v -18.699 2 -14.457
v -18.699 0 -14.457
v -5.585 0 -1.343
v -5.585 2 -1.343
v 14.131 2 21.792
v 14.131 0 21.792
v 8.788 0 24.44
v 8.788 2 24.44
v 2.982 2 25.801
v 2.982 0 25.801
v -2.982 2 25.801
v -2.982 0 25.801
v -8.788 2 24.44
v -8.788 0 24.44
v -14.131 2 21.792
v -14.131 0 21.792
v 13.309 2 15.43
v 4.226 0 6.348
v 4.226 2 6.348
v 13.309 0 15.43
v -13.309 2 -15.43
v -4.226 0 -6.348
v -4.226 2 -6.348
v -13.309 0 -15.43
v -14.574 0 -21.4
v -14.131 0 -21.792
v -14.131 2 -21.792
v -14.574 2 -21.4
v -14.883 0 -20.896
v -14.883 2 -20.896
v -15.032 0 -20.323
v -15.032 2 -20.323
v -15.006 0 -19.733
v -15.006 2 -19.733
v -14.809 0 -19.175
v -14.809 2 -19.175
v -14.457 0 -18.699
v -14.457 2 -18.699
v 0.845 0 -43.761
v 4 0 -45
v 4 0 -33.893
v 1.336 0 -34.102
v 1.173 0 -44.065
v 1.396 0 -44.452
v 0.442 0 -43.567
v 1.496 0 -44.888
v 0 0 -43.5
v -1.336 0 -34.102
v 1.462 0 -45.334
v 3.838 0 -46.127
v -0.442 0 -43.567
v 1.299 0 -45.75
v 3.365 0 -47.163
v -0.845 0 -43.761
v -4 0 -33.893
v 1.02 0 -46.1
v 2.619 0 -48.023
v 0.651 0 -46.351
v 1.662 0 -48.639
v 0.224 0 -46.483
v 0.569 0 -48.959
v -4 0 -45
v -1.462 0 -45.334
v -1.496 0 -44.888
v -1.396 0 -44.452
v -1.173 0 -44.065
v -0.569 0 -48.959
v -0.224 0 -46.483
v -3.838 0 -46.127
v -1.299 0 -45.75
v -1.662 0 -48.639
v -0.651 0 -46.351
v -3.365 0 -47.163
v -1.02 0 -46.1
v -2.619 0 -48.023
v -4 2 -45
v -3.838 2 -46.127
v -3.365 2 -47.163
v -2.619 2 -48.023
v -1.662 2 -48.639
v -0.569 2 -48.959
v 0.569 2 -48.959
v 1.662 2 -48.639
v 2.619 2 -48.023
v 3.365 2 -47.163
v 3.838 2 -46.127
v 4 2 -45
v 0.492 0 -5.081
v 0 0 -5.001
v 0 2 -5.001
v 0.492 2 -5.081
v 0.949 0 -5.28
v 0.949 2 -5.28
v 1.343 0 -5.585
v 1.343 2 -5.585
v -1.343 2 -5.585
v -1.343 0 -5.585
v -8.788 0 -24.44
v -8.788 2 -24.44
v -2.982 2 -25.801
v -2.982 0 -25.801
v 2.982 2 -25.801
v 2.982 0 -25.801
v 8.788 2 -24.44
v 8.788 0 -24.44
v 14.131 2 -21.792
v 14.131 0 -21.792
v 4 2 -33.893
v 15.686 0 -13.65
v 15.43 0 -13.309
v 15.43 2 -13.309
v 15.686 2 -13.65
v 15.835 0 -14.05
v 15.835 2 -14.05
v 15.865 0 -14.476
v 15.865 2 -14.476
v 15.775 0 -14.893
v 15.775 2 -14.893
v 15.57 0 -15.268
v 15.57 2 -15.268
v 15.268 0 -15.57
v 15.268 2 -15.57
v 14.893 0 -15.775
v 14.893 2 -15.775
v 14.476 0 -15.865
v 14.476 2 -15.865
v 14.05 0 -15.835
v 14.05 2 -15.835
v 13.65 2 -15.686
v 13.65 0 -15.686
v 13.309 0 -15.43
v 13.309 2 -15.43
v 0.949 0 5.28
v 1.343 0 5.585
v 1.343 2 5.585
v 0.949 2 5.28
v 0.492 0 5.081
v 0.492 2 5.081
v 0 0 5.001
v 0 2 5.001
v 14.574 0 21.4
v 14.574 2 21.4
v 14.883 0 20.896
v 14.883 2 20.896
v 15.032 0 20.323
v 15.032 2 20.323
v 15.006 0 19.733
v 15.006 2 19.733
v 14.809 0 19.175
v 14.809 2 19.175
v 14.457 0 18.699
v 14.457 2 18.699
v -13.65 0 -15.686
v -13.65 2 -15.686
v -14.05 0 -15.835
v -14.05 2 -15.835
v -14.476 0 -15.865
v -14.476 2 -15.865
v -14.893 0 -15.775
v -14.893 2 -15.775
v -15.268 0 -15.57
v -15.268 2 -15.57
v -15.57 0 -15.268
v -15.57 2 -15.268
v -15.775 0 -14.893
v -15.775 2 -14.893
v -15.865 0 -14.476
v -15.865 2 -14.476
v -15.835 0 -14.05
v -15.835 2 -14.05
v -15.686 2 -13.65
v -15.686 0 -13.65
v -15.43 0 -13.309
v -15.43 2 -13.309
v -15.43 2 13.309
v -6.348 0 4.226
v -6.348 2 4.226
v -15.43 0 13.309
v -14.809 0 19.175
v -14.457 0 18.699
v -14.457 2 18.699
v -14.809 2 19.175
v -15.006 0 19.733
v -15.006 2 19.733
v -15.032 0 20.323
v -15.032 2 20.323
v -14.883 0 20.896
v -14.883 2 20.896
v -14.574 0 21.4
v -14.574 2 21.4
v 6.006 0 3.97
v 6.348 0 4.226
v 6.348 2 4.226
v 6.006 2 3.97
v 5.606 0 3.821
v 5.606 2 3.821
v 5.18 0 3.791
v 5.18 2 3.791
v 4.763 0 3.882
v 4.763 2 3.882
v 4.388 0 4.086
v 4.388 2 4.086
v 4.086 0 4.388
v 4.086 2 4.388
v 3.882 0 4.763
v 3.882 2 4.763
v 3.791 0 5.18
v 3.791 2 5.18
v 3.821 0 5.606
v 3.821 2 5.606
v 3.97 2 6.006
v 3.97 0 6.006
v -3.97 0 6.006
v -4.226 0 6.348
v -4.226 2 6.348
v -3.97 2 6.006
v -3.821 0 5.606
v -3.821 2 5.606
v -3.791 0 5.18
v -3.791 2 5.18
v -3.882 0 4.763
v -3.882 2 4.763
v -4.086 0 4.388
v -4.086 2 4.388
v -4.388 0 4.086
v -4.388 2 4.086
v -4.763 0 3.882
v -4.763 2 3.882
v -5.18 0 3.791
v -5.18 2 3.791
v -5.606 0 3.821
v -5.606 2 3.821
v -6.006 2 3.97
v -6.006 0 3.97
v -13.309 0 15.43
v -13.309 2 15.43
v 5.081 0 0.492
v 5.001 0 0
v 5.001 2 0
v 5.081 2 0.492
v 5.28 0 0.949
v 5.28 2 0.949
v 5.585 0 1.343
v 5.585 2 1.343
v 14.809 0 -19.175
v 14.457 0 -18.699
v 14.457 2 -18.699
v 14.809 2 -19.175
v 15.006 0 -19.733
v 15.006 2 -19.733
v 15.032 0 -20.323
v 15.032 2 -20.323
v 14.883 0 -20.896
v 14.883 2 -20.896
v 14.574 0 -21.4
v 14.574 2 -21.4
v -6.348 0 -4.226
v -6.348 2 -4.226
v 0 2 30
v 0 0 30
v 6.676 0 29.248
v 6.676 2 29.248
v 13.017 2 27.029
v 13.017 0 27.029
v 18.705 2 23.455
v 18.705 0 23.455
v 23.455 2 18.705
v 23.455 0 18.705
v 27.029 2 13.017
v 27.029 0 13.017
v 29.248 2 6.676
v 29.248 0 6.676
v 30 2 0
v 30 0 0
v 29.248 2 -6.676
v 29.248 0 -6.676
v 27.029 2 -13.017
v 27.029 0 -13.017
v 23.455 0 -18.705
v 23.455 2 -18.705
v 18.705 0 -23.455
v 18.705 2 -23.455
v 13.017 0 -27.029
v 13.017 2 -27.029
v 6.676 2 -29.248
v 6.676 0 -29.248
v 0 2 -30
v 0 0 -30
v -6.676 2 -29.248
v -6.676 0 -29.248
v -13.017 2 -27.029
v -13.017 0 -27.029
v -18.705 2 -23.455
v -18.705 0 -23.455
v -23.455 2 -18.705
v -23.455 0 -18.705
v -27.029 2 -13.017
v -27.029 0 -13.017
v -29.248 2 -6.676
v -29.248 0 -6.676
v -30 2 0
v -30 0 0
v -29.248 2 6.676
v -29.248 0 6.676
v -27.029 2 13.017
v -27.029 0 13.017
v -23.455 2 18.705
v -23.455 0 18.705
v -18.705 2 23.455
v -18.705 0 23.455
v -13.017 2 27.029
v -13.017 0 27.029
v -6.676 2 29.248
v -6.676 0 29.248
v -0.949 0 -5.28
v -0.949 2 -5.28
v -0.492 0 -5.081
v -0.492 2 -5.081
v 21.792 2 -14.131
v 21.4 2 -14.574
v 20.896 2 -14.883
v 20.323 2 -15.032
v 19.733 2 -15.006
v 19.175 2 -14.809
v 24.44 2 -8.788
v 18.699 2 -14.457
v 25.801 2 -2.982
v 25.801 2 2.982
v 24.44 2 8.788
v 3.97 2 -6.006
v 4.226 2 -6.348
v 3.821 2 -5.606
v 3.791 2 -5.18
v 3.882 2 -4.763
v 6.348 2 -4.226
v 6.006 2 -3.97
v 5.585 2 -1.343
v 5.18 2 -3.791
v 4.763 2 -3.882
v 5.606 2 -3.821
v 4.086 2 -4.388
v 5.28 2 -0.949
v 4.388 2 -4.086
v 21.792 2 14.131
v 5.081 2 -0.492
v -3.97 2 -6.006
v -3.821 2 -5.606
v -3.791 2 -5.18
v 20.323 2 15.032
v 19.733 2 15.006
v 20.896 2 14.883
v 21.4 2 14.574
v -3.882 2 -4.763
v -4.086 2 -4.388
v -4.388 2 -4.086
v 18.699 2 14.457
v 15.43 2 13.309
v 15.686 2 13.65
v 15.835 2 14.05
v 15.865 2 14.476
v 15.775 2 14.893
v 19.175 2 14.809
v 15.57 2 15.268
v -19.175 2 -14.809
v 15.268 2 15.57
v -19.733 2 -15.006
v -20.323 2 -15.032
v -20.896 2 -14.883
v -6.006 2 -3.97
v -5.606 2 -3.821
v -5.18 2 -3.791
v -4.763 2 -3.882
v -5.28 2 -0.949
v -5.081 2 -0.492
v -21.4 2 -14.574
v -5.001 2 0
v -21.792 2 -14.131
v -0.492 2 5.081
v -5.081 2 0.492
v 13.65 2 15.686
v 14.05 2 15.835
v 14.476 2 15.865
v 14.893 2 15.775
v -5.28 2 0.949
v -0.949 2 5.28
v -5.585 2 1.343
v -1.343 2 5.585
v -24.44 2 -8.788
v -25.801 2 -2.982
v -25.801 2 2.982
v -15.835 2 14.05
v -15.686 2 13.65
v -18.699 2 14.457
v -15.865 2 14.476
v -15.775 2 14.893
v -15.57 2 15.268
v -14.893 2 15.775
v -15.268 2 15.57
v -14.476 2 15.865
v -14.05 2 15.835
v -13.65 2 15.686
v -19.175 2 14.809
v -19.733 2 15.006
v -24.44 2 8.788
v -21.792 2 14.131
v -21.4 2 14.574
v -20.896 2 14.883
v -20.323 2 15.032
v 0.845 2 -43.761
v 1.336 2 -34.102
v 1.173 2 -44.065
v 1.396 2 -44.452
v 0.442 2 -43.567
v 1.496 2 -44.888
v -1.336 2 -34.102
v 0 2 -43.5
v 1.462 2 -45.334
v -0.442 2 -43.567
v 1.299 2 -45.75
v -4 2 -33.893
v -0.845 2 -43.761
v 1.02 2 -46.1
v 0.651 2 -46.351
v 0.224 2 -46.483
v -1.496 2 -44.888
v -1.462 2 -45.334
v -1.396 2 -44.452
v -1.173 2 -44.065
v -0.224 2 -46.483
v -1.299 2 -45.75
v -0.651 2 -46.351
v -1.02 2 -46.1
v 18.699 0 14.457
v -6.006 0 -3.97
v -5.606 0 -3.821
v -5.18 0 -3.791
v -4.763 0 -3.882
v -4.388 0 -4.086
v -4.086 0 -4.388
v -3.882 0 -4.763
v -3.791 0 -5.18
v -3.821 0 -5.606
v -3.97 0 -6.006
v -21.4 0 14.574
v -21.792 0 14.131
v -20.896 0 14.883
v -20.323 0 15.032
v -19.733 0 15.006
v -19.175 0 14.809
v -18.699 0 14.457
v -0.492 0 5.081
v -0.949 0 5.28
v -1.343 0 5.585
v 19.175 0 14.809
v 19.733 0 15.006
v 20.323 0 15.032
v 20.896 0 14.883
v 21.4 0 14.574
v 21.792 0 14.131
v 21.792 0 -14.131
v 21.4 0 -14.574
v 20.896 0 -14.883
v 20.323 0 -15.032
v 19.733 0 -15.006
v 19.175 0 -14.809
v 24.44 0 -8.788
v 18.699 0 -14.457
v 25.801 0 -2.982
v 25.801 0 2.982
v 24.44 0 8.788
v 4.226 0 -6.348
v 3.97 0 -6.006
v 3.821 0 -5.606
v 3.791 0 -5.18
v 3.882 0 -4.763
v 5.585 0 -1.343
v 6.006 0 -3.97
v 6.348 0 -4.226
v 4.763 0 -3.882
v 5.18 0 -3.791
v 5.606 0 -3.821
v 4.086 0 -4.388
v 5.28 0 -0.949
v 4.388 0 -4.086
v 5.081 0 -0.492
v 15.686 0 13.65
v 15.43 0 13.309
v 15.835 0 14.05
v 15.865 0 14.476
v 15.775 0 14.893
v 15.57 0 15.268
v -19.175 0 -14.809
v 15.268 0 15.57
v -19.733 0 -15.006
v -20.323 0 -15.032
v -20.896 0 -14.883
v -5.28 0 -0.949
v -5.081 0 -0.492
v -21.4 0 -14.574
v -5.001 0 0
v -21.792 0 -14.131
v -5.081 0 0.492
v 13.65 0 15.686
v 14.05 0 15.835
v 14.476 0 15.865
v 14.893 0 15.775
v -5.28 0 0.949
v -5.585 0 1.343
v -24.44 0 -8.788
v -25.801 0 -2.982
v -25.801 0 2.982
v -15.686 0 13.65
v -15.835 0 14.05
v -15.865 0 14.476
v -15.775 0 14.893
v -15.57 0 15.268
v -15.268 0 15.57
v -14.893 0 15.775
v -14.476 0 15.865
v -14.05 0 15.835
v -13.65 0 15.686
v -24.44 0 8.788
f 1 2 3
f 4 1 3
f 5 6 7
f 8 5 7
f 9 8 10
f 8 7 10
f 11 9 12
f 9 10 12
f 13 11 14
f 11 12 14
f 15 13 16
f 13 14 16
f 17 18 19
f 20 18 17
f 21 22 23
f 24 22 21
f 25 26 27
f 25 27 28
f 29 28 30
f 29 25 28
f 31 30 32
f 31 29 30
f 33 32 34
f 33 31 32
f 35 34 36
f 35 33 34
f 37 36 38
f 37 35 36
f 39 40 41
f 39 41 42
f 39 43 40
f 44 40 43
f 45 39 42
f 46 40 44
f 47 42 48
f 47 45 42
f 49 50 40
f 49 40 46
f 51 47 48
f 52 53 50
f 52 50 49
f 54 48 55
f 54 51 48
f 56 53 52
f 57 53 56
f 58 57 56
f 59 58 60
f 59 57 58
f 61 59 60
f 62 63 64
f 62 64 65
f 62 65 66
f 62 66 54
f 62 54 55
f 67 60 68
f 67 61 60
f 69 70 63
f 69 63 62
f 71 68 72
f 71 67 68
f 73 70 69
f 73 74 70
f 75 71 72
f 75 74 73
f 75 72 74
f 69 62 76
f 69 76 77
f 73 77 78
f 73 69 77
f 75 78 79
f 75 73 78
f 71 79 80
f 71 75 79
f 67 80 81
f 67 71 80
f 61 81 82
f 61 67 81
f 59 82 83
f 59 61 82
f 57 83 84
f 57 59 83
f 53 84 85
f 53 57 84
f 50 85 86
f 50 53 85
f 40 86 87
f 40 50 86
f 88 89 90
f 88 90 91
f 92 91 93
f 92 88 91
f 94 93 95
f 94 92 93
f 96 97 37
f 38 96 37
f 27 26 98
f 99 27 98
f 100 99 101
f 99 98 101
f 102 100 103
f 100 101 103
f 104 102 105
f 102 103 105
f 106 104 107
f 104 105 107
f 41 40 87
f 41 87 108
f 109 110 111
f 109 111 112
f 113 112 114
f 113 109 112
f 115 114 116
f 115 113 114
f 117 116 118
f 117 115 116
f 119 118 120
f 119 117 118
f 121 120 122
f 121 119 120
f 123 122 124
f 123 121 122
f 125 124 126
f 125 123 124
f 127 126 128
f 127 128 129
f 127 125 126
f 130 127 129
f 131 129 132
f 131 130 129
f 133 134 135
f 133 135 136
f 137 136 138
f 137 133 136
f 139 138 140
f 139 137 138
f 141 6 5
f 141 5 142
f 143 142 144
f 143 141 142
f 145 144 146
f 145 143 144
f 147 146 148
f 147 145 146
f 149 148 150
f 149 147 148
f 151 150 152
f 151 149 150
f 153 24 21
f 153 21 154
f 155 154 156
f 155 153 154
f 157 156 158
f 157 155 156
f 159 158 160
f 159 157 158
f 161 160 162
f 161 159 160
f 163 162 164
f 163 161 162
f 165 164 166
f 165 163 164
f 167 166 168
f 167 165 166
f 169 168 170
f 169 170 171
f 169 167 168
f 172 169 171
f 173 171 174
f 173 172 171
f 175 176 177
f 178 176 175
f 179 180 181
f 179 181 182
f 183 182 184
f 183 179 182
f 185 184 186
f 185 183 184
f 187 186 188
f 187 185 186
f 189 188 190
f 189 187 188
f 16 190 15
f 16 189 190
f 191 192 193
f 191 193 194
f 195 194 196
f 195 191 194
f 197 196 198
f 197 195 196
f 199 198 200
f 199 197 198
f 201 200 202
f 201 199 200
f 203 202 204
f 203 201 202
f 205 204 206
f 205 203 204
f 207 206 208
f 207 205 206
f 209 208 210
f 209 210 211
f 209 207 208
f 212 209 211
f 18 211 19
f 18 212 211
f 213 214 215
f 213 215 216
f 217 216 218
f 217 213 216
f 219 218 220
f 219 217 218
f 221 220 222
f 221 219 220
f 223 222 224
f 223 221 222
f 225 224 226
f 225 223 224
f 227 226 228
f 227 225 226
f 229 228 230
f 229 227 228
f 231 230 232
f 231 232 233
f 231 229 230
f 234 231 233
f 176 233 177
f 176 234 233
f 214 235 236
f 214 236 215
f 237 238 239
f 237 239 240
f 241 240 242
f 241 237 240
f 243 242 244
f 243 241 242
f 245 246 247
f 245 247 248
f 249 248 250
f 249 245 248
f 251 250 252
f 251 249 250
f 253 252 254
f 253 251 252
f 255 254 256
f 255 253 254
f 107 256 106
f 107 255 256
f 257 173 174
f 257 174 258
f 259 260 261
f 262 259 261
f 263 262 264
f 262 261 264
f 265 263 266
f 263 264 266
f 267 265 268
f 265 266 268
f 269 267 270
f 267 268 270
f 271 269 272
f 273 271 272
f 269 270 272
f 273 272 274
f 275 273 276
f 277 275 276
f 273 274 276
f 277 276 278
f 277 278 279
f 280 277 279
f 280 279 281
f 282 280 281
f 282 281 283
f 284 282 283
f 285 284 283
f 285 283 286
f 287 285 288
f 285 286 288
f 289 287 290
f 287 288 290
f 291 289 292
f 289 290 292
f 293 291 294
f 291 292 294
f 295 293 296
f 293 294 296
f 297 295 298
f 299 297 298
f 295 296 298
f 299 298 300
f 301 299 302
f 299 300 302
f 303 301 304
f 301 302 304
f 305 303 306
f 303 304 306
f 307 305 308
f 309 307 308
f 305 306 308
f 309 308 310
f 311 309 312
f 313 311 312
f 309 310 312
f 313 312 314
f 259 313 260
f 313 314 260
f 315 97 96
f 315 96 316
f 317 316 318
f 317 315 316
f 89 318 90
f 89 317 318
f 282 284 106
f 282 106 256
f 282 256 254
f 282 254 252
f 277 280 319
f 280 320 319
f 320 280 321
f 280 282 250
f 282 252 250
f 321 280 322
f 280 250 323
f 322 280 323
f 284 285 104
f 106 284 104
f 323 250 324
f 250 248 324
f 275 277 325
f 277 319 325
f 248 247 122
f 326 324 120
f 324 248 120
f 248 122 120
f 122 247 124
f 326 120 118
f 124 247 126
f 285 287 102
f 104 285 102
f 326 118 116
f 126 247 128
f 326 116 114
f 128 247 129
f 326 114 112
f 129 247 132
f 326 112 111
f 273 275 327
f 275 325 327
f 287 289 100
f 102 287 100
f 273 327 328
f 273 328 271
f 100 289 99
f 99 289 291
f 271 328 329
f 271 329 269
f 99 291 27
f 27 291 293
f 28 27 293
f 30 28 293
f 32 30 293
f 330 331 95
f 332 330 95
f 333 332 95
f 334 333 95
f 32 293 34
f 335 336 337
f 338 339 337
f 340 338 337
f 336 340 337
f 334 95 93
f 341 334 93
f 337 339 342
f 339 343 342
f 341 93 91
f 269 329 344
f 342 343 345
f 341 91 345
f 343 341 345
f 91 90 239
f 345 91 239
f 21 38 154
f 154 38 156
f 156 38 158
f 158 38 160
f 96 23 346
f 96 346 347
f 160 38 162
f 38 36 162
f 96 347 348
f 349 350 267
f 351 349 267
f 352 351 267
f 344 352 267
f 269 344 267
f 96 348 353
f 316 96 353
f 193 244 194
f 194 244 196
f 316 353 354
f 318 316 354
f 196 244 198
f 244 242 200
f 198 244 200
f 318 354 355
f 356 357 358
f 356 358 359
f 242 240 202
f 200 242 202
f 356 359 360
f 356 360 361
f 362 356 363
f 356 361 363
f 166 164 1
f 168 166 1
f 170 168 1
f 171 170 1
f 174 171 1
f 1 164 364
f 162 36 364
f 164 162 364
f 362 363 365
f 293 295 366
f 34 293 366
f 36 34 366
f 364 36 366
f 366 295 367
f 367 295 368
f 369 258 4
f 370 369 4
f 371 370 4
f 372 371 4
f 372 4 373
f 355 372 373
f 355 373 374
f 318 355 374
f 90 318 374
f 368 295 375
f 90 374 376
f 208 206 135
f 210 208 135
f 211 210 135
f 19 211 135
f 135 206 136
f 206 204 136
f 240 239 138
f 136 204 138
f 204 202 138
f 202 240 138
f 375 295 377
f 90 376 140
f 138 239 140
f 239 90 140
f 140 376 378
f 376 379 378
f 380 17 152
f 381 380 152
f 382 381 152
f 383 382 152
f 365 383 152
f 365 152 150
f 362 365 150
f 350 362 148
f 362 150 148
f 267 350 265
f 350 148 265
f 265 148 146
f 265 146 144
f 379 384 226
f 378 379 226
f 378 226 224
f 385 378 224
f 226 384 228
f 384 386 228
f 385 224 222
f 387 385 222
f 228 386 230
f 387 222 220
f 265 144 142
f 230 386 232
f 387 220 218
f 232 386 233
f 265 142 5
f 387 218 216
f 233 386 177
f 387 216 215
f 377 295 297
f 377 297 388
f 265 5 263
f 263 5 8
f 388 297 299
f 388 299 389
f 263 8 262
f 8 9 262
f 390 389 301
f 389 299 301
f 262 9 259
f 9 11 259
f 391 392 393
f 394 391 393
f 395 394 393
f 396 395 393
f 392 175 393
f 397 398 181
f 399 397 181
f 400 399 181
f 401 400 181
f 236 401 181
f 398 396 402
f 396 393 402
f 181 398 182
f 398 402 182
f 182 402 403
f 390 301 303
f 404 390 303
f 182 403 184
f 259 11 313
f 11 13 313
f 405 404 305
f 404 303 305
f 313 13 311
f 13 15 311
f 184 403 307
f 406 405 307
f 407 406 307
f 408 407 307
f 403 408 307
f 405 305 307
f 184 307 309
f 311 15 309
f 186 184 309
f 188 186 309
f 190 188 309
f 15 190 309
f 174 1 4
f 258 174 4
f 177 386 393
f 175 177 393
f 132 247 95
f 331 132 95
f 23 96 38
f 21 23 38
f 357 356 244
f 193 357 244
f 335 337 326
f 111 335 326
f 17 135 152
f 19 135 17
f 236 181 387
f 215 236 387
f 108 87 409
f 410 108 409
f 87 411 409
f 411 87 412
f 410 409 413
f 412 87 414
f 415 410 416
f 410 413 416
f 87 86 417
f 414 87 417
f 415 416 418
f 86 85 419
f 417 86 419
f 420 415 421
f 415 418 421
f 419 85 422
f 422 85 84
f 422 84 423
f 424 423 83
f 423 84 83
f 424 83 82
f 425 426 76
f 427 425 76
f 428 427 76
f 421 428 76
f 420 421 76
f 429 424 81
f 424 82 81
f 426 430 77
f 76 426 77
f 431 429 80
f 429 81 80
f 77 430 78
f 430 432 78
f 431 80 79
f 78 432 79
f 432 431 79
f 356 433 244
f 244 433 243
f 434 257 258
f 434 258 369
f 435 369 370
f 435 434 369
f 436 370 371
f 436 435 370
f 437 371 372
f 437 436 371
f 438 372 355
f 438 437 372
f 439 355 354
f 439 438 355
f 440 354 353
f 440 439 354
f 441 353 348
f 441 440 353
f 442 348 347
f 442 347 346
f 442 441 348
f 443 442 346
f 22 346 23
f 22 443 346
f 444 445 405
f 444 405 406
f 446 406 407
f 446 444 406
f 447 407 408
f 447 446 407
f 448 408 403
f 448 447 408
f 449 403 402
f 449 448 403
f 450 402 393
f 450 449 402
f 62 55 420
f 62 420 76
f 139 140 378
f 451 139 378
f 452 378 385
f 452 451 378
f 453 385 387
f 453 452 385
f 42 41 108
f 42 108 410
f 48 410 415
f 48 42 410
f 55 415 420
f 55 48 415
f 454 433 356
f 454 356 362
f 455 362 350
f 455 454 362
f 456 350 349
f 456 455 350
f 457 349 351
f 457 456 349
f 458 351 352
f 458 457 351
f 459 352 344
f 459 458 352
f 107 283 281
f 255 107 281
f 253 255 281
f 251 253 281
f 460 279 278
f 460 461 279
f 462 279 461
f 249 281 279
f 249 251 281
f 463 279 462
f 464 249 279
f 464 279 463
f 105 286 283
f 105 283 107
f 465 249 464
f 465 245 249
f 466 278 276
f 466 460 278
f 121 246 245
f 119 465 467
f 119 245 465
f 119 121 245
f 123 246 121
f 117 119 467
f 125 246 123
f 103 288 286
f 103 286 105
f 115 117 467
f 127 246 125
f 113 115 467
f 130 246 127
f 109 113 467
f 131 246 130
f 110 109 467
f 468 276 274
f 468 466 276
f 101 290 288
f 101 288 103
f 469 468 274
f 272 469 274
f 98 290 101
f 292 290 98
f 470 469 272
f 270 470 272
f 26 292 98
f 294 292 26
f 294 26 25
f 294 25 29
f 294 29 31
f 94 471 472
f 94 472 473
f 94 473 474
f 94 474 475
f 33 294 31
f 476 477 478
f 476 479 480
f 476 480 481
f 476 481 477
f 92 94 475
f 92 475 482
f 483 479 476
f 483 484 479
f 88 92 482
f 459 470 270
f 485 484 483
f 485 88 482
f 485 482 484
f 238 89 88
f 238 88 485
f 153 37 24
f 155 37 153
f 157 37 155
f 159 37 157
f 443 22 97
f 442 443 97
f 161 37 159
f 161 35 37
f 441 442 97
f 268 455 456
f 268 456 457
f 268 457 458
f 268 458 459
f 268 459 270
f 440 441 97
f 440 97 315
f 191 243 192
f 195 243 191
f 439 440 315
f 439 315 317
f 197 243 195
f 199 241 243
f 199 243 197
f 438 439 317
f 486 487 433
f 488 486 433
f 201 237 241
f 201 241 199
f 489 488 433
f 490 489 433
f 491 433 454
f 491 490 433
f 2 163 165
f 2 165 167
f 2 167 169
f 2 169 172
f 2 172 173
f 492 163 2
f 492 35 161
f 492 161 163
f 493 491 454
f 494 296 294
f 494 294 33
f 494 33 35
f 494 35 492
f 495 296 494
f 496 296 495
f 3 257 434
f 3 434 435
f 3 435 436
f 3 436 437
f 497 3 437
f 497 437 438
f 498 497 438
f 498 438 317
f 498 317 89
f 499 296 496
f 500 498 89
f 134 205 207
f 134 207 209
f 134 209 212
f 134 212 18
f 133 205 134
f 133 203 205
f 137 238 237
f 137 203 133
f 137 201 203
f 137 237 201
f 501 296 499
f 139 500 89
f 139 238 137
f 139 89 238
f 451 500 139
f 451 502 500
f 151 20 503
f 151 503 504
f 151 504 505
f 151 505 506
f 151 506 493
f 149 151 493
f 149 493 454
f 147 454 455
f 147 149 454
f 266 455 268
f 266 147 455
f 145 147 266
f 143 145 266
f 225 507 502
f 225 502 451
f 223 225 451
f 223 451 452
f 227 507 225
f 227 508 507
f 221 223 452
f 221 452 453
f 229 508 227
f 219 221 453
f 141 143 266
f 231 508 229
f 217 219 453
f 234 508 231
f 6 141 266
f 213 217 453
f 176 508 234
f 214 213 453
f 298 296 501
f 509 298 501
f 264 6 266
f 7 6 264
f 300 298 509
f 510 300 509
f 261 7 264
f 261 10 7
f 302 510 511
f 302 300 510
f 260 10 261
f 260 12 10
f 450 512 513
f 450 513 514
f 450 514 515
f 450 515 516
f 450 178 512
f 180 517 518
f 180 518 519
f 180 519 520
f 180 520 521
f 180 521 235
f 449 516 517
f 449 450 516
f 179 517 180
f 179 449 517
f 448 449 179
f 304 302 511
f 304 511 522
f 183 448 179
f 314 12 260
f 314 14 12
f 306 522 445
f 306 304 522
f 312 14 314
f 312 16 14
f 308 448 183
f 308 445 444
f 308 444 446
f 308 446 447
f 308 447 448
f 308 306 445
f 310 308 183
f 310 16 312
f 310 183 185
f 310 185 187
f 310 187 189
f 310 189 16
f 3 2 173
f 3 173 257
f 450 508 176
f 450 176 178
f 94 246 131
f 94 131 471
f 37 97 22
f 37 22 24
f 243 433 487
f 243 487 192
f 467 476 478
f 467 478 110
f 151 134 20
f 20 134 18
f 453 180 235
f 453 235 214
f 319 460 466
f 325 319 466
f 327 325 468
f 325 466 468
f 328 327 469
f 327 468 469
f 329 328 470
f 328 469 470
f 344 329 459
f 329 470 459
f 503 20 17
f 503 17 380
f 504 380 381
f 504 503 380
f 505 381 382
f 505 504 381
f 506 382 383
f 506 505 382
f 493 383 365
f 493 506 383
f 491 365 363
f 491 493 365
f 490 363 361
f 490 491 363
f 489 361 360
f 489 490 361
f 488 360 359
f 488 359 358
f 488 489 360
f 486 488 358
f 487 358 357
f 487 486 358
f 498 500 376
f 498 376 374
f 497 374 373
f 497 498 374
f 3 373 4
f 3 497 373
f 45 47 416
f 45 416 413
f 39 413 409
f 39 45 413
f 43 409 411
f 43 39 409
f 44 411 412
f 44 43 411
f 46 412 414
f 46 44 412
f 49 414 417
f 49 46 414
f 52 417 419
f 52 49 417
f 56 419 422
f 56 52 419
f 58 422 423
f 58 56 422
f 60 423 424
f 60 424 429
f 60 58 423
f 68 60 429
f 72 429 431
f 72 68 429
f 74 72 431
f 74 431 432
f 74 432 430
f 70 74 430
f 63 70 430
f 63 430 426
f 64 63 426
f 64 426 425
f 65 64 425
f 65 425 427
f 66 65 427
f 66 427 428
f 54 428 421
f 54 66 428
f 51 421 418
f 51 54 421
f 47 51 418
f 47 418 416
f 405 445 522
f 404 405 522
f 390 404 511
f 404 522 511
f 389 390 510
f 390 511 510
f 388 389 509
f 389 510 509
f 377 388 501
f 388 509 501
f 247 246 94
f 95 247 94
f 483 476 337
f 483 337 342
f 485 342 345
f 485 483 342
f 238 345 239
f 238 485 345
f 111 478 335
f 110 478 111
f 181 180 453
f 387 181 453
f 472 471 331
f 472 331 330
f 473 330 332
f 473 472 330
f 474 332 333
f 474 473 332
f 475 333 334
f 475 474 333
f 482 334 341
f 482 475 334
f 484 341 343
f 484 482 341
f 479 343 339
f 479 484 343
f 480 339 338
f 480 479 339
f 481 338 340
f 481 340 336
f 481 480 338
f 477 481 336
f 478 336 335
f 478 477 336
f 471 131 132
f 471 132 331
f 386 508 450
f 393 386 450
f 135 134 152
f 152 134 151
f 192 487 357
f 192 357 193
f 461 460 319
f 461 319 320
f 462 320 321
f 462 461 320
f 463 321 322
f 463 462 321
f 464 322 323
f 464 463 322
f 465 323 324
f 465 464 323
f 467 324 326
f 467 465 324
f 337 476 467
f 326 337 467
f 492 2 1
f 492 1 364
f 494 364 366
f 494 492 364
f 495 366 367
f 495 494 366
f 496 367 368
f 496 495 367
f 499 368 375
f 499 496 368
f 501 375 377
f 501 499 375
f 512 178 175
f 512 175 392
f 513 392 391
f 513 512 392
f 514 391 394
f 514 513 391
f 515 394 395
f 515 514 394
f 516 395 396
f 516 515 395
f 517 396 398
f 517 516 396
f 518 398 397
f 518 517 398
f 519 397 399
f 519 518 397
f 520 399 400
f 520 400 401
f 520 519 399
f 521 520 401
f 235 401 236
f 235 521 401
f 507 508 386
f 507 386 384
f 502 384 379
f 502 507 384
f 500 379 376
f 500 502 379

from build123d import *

# Parameters (mm, degrees)
SKETCH1_R                = 29.999999999999996
BOSS_EXTRUDE1_DEPTH      = 2
SKETCH2_R                = 1.5000000000000024
BOSS_EXTRUDE2_DEPTH      = 2
CUT_EXTRUDE1_DEPTH       = 2
FILLET1_R                = 2
CIRPATTERN3_COUNT        = 4
FILLET1_OF_CIRPATTERN3_R = 2


with BuildPart() as part:
    # Sketch1 → Boss-Extrude1 (new body)
    with BuildSketch(Plane(origin=(0, 0, 0), x_dir=(1, 0, 0), z_dir=(0, 1, 0))):
        with Locations(Location((0, 0, 0), (0, 0, 270))):
            Circle(SKETCH1_R)
    extrude(amount=BOSS_EXTRUDE1_DEPTH)

    # Sketch3 → Cut-Extrude1 (cut)
    with BuildSketch(Plane.XZ):
        with BuildLine():
            Line((-16.120955993884955, 20.363596681004037), (-0.707106781186571, 4.949747468305829))
            ThreePointArc((-0.707106781186571, 4.949747468305829), (-1.635e-14, 5), (0.7071067811865381, 4.9497474683058345))
            Line((0.7071067811865381, 4.9497474683058345), (16.1209559938848, 20.363596681004154))
            ThreePointArc((16.1209559938848, 20.363596681004154), (-1.0222e-13, 25.9723178007542), (-16.120955993884955, 20.363596681004037))
        make_face()
        with BuildLine():
            Line((4.226275356880876, 6.347595700440537), (13.308564754978745, 15.429885098538437))
            ThreePointArc((13.308564754978745, 15.429885098538437), (15.429885098538385, 15.42988509853844), (15.429885098538387, 13.3085647549788))
            Line((15.429885098538387, 13.3085647549788), (6.347595700440546, 4.226275356880927))
            ThreePointArc((6.347595700440546, 4.226275356880927), (4.226275356880893, 4.226275356880883), (4.226275356880876, 6.347595700440537))
        make_face()
    cut_extrude1 = extrude(amount=-CUT_EXTRUDE1_DEPTH, mode=Mode.SUBTRACT)

    # Fillet1
    # the kernel refuses this fillet: 2 mm, written as the material it adds along each edge
    with BuildSketch(Plane(origin=(16.1209559938848, 0, 20.363596681004154), x_dir=(-0.8124484694054139, 0, 0.5830330046925304), z_dir=(0, 1, 0))) as fillet1_piece_1:
        with BuildLine():
            CenterArc((2.355278550114305, -1.9977749052453315), FILLET1_R, 87.29705530283536, 102.03879267807281)
            Line((0.38176972340459264, -2.322217366860414), (0, 0))
            ThreePointArc((0, 0), (1.2247970633110545, 0.02889543405250306), (2.4495941266221117, -1e-17))
        make_face()
    extrude(amount=2)
    with BuildSketch(Plane(origin=(-16.120955993884955, 0, 20.36359668100404), x_dir=(0.8124484694054097, 0, 0.5830330046925363), z_dir=(0, 1, 0))) as fillet1_piece_2:
        with BuildLine():
            CenterArc((2.3552785501143045, 1.9977749052453322), FILLET1_R, 170.66415201909183, 102.03879267807281)
            Line((0.38176972340459064, 2.3222173668604142), (0, 0))
            ThreePointArc((0, 0), (1.224797063311054, -0.02889543405249918), (2.4495941266221117, 4e-17))
        make_face()
    extrude(amount=2)
    with BuildSketch(Plane(origin=(-0.707106781186571, 0, 4.94974746830583), x_dir=(0.9978329265871119, 0, 0.06579856091587097), z_dir=(0, 1, 0))) as fillet1_piece_3:
        with BuildLine():
            CenterArc((0.9117316045667684, -1.9942190443130732), FILLET1_R, 94.35739687847523, 44.41530859723521)
            Line((-0.592470470427697, -0.6761234037837734), (0, 0))
            ThreePointArc((0, 0), (0.3798881685694877, -0.01445238921731624), (0.7597763371389753, 0))
        make_face()
    extrude(amount=2)
    with BuildSketch(Plane(origin=(0.7071067811865382, 0, 4.949747468305835), x_dir=(0.7071067811865465, 0, 0.7071067811865486), z_dir=(0, 1, 0))) as fillet1_piece_4:
        with BuildLine():
            CenterArc((0.8989794855684893, -2), FILLET1_R, 89.99999999999997, 44.41530859720547)
            ThreePointArc((-0.5007289388793513, -0.5714285714288758), (-0.23949481251558302, -0.2952391013252418), (0, 0))
            Line((0, 0), (0.8989794855684903, 2e-17))
        make_face()
    extrude(amount=2)

    # CirPattern3: Cut-Extrude1 ×4 about axis
    cirpattern3_axis = Axis((-1.408e-14, 0, 2.84e-15), (0, 1, 0))
    for i in range(1, CIRPATTERN3_COUNT):
        add(cut_extrude1.rotate(cirpattern3_axis, i * 360 / CIRPATTERN3_COUNT), mode=Mode.SUBTRACT)

    # Fillet1 of CirPattern3
    # the kernel refuses this fillet: 2 mm, written as the material it adds along each edge
    with BuildSketch(Plane(origin=(20.36359668100414, 0, -16.120955993884806), x_dir=(0.5830330046925314, 0, 0.8124484694054133), z_dir=(0, 1, 0))) as fillet1_of_cirpattern3_piece_1:
        with BuildLine():
            CenterArc((2.3552785501143045, -1.9977749052453315), FILLET1_OF_CIRPATTERN3_R, 87.29705530283529, 102.03879267807281)
            Line((0.3817697234045918, -2.3222173668604116), (0, 0))
            ThreePointArc((0, 0), (1.2247970633110554, 0.02889543405249672), (2.449594126622114, 4e-17))
        make_face()
    extrude(amount=2)
    with BuildSketch(Plane(origin=(20.36359668100402, 0, 16.120955993884948), x_dir=(-0.7071067811865438, 0, -0.7071067811865513), z_dir=(0, 1, 0))) as fillet1_of_cirpattern3_piece_2:
        with BuildLine():
            CenterArc((2.353389389934555, -2), FILLET1_OF_CIRPATTERN3_R, 89.99999999999997, 102.03879267807287)
            ThreePointArc((0.3973761741995627, -2.4171478153725032), (0.17017539002267335, -1.2132613605629643), (0, 0))
            Line((0, 0), (2.3533893899345557, 5e-17))
        make_face()
    extrude(amount=2)
    with BuildSketch(Plane(origin=(4.949747468305813, 0, 0.7071067811865603), x_dir=(0.7071067811865409, 0, 0.707106781186554), z_dir=(0, 1, 0))) as fillet1_of_cirpattern3_piece_3:
        with BuildLine():
            CenterArc((0.8989794855684675, 1.9999999999999998), FILLET1_OF_CIRPATTERN3_R, 225.58469140279482, 44.41530859720535)
            ThreePointArc((-0.5007289388793674, 0.571428571428869), (-0.23949481251558677, 0.29523910132524234), (0, 0))
            Line((0, 0), (0.8989794855684747, 1e-17))
        make_face()
    extrude(amount=2)
    with BuildSketch(Plane(origin=(4.9497474683058185, 0, -0.7071067811865489), x_dir=(0.06579856091586167, 0, 0.9978329265871125), z_dir=(0, 1, 0))) as fillet1_of_cirpattern3_piece_4:
        with BuildLine():
            CenterArc((0.9117316045667834, 1.9942190443130732), FILLET1_OF_CIRPATTERN3_R, 221.2272945242899, 44.4153085972348)
            Line((-0.5924704704276744, 0.6761234037837643), (0, 0))
            ThreePointArc((0, 0), (0.3798881685694939, 0.0144523892173167), (0.7597763371389883, 0))
        make_face()
    extrude(amount=2)
    with BuildSketch(Plane(origin=(-16.120955993884824, 0, -20.36359668100415), x_dir=(0.8124484694054139, 0, -0.5830330046925304), z_dir=(0, 1, 0))) as fillet1_of_cirpattern3_piece_5:
        with BuildLine():
            CenterArc((2.3552785501143063, -1.9977749052453326), FILLET1_OF_CIRPATTERN3_R, 87.2970553028354, 102.03879267807275)
            Line((0.38176972340459264, -2.322217366860414), (0, 0))
            ThreePointArc((0, 0), (1.2247970633110539, 0.02889543405249918), (2.4495941266221117, -1e-17))
        make_face()
    extrude(amount=2)
    with BuildSketch(Plane(origin=(16.12095599388493, 0, -20.36359668100403), x_dir=(-0.7071067811865509, 0, 0.7071067811865441), z_dir=(0, 1, 0))) as fillet1_of_cirpattern3_piece_6:
        with BuildLine():
            CenterArc((2.3533893899345526, -2), FILLET1_OF_CIRPATTERN3_R, 89.99999999999996, 102.03879267807292)
            ThreePointArc((0.39737617419956145, -2.4171478153725032), (0.17017539002267143, -1.2132613605629632), (0, 0))
            Line((0, 0), (2.353389389934554, -1.2e-16))
        make_face()
    extrude(amount=2)
    with BuildSketch(Plane(origin=(0.7071067811865434, 0, -4.949747468305825), x_dir=(0.7071067811865541, 0, -0.7071067811865409), z_dir=(0, 1, 0))) as fillet1_of_cirpattern3_piece_7:
        with BuildLine():
            CenterArc((0.8989794855684662, 1.9999999999999998), FILLET1_OF_CIRPATTERN3_R, 225.58469140279482, 44.41530859720535)
            ThreePointArc((-0.5007289388793689, 0.5714285714288692), (-0.23949481251558713, 0.2952391013252426), (0, 0))
            Line((0, 0), (0.8989794855684736, -1e-17))
        make_face()
    extrude(amount=2)
    with BuildSketch(Plane(origin=(-0.7071067811865659, 0, -4.94974746830583), x_dir=(0.9978329265871123, 0, -0.06579856091586292), z_dir=(0, 1, 0))) as fillet1_of_cirpattern3_piece_8:
        with BuildLine():
            CenterArc((0.911731604566765, 1.9942190443130734), FILLET1_OF_CIRPATTERN3_R, 221.22729452428956, 44.41530859723525)
            Line((-0.5924704704277004, 0.6761234037837739), (0, 0))
            ThreePointArc((0, 0), (0.37988816856948704, 0.01445238921731667), (0.7597763371389734, 1e-17))
        make_face()
    extrude(amount=2)
    with BuildSketch(Plane(origin=(-20.363596681004168, 0, 16.120955993884813), x_dir=(0.7071067811865483, 0, -0.7071067811865468), z_dir=(0, 1, 0))) as fillet1_of_cirpattern3_piece_9:
        with BuildLine():
            CenterArc((2.353389389934557, 2), FILLET1_OF_CIRPATTERN3_R, 167.96120732192713, 102.03879267807281)
            ThreePointArc((0.3973761741995647, 2.4171478153725037), (0.17017539002267684, 1.2132613605629667), (0, 0))
            Line((0, 0), (2.3533893899345557, -1e-17))
        make_face()
    extrude(amount=2)
    with BuildSketch(Plane(origin=(-20.363596681004047, 0, -16.12095599388494), x_dir=(0.7071067811865438, 0, 0.7071067811865513), z_dir=(0, 1, 0))) as fillet1_of_cirpattern3_piece_10:
        with BuildLine():
            CenterArc((2.353389389934555, -2), FILLET1_OF_CIRPATTERN3_R, 89.99999999999997, 102.03879267807287)
            ThreePointArc((0.3973761741995627, -2.4171478153725032), (0.17017539002267457, -1.2132613605629707), (0, 0))
            Line((0, 0), (2.3533893899345557, 5e-17))
        make_face()
    extrude(amount=2)
    with BuildSketch(Plane(origin=(-4.949747468305842, 0, -0.7071067811865552), x_dir=(-0.7071067811865421, 0, -0.707106781186553), z_dir=(0, 1, 0))) as fillet1_of_cirpattern3_piece_11:
        with BuildLine():
            CenterArc((0.898979485568472, 2), FILLET1_OF_CIRPATTERN3_R, 225.58469140279476, 44.41530859720535)
            ThreePointArc((-0.5007289388793642, 0.5714285714288699), (-0.23949481251558577, 0.29523910132524217), (0, 0))
            Line((0, 0), (0.898979485568476, 0))
        make_face()
    extrude(amount=2)
    with BuildSketch(Plane(origin=(-4.949747468305847, 0, 0.707106781186554), x_dir=(-0.06579856091586256, 0, -0.9978329265871123), z_dir=(0, 1, 0))) as fillet1_of_cirpattern3_piece_12:
        with BuildLine():
            CenterArc((0.9117316045667706, 1.994219044313073), FILLET1_OF_CIRPATTERN3_R, 221.22729452428956, 44.41530859723525)
            Line((-0.5924704704276954, 0.6761234037837742), (0, 0))
            ThreePointArc((0, 0), (0.3798881685694889, 0.01445238921731668), (0.7597763371389777, 0))
        make_face()
    extrude(amount=2)


with BuildPart() as body_2:
    # Sketch2 → Boss-Extrude2 (new body)
    with BuildSketch(Plane(origin=(0, 0, 0), x_dir=(1, 0, 0), z_dir=(0, 1, 0))):
        with BuildLine():
            Line((-4, 33.89323148929319), (-3.999999999999999, 45))
            ThreePointArc((-3.999999999999999, 45), (2.4e-16, 49), (4, 45))
            Line((4, 45), (4, 33.89323148929319))
            ThreePointArc((4, 33.89323148929319), (2.09e-15, 34.128450606302295), (-4, 33.89323148929319))
        make_face()
        with Locations(Location((0, 45, 0), (0, 0, 270))):
            Circle(SKETCH2_R, mode=Mode.SUBTRACT)
    extrude(amount=BOSS_EXTRUDE2_DEPTH)


solid = Compound([part.part, body_2.part])
